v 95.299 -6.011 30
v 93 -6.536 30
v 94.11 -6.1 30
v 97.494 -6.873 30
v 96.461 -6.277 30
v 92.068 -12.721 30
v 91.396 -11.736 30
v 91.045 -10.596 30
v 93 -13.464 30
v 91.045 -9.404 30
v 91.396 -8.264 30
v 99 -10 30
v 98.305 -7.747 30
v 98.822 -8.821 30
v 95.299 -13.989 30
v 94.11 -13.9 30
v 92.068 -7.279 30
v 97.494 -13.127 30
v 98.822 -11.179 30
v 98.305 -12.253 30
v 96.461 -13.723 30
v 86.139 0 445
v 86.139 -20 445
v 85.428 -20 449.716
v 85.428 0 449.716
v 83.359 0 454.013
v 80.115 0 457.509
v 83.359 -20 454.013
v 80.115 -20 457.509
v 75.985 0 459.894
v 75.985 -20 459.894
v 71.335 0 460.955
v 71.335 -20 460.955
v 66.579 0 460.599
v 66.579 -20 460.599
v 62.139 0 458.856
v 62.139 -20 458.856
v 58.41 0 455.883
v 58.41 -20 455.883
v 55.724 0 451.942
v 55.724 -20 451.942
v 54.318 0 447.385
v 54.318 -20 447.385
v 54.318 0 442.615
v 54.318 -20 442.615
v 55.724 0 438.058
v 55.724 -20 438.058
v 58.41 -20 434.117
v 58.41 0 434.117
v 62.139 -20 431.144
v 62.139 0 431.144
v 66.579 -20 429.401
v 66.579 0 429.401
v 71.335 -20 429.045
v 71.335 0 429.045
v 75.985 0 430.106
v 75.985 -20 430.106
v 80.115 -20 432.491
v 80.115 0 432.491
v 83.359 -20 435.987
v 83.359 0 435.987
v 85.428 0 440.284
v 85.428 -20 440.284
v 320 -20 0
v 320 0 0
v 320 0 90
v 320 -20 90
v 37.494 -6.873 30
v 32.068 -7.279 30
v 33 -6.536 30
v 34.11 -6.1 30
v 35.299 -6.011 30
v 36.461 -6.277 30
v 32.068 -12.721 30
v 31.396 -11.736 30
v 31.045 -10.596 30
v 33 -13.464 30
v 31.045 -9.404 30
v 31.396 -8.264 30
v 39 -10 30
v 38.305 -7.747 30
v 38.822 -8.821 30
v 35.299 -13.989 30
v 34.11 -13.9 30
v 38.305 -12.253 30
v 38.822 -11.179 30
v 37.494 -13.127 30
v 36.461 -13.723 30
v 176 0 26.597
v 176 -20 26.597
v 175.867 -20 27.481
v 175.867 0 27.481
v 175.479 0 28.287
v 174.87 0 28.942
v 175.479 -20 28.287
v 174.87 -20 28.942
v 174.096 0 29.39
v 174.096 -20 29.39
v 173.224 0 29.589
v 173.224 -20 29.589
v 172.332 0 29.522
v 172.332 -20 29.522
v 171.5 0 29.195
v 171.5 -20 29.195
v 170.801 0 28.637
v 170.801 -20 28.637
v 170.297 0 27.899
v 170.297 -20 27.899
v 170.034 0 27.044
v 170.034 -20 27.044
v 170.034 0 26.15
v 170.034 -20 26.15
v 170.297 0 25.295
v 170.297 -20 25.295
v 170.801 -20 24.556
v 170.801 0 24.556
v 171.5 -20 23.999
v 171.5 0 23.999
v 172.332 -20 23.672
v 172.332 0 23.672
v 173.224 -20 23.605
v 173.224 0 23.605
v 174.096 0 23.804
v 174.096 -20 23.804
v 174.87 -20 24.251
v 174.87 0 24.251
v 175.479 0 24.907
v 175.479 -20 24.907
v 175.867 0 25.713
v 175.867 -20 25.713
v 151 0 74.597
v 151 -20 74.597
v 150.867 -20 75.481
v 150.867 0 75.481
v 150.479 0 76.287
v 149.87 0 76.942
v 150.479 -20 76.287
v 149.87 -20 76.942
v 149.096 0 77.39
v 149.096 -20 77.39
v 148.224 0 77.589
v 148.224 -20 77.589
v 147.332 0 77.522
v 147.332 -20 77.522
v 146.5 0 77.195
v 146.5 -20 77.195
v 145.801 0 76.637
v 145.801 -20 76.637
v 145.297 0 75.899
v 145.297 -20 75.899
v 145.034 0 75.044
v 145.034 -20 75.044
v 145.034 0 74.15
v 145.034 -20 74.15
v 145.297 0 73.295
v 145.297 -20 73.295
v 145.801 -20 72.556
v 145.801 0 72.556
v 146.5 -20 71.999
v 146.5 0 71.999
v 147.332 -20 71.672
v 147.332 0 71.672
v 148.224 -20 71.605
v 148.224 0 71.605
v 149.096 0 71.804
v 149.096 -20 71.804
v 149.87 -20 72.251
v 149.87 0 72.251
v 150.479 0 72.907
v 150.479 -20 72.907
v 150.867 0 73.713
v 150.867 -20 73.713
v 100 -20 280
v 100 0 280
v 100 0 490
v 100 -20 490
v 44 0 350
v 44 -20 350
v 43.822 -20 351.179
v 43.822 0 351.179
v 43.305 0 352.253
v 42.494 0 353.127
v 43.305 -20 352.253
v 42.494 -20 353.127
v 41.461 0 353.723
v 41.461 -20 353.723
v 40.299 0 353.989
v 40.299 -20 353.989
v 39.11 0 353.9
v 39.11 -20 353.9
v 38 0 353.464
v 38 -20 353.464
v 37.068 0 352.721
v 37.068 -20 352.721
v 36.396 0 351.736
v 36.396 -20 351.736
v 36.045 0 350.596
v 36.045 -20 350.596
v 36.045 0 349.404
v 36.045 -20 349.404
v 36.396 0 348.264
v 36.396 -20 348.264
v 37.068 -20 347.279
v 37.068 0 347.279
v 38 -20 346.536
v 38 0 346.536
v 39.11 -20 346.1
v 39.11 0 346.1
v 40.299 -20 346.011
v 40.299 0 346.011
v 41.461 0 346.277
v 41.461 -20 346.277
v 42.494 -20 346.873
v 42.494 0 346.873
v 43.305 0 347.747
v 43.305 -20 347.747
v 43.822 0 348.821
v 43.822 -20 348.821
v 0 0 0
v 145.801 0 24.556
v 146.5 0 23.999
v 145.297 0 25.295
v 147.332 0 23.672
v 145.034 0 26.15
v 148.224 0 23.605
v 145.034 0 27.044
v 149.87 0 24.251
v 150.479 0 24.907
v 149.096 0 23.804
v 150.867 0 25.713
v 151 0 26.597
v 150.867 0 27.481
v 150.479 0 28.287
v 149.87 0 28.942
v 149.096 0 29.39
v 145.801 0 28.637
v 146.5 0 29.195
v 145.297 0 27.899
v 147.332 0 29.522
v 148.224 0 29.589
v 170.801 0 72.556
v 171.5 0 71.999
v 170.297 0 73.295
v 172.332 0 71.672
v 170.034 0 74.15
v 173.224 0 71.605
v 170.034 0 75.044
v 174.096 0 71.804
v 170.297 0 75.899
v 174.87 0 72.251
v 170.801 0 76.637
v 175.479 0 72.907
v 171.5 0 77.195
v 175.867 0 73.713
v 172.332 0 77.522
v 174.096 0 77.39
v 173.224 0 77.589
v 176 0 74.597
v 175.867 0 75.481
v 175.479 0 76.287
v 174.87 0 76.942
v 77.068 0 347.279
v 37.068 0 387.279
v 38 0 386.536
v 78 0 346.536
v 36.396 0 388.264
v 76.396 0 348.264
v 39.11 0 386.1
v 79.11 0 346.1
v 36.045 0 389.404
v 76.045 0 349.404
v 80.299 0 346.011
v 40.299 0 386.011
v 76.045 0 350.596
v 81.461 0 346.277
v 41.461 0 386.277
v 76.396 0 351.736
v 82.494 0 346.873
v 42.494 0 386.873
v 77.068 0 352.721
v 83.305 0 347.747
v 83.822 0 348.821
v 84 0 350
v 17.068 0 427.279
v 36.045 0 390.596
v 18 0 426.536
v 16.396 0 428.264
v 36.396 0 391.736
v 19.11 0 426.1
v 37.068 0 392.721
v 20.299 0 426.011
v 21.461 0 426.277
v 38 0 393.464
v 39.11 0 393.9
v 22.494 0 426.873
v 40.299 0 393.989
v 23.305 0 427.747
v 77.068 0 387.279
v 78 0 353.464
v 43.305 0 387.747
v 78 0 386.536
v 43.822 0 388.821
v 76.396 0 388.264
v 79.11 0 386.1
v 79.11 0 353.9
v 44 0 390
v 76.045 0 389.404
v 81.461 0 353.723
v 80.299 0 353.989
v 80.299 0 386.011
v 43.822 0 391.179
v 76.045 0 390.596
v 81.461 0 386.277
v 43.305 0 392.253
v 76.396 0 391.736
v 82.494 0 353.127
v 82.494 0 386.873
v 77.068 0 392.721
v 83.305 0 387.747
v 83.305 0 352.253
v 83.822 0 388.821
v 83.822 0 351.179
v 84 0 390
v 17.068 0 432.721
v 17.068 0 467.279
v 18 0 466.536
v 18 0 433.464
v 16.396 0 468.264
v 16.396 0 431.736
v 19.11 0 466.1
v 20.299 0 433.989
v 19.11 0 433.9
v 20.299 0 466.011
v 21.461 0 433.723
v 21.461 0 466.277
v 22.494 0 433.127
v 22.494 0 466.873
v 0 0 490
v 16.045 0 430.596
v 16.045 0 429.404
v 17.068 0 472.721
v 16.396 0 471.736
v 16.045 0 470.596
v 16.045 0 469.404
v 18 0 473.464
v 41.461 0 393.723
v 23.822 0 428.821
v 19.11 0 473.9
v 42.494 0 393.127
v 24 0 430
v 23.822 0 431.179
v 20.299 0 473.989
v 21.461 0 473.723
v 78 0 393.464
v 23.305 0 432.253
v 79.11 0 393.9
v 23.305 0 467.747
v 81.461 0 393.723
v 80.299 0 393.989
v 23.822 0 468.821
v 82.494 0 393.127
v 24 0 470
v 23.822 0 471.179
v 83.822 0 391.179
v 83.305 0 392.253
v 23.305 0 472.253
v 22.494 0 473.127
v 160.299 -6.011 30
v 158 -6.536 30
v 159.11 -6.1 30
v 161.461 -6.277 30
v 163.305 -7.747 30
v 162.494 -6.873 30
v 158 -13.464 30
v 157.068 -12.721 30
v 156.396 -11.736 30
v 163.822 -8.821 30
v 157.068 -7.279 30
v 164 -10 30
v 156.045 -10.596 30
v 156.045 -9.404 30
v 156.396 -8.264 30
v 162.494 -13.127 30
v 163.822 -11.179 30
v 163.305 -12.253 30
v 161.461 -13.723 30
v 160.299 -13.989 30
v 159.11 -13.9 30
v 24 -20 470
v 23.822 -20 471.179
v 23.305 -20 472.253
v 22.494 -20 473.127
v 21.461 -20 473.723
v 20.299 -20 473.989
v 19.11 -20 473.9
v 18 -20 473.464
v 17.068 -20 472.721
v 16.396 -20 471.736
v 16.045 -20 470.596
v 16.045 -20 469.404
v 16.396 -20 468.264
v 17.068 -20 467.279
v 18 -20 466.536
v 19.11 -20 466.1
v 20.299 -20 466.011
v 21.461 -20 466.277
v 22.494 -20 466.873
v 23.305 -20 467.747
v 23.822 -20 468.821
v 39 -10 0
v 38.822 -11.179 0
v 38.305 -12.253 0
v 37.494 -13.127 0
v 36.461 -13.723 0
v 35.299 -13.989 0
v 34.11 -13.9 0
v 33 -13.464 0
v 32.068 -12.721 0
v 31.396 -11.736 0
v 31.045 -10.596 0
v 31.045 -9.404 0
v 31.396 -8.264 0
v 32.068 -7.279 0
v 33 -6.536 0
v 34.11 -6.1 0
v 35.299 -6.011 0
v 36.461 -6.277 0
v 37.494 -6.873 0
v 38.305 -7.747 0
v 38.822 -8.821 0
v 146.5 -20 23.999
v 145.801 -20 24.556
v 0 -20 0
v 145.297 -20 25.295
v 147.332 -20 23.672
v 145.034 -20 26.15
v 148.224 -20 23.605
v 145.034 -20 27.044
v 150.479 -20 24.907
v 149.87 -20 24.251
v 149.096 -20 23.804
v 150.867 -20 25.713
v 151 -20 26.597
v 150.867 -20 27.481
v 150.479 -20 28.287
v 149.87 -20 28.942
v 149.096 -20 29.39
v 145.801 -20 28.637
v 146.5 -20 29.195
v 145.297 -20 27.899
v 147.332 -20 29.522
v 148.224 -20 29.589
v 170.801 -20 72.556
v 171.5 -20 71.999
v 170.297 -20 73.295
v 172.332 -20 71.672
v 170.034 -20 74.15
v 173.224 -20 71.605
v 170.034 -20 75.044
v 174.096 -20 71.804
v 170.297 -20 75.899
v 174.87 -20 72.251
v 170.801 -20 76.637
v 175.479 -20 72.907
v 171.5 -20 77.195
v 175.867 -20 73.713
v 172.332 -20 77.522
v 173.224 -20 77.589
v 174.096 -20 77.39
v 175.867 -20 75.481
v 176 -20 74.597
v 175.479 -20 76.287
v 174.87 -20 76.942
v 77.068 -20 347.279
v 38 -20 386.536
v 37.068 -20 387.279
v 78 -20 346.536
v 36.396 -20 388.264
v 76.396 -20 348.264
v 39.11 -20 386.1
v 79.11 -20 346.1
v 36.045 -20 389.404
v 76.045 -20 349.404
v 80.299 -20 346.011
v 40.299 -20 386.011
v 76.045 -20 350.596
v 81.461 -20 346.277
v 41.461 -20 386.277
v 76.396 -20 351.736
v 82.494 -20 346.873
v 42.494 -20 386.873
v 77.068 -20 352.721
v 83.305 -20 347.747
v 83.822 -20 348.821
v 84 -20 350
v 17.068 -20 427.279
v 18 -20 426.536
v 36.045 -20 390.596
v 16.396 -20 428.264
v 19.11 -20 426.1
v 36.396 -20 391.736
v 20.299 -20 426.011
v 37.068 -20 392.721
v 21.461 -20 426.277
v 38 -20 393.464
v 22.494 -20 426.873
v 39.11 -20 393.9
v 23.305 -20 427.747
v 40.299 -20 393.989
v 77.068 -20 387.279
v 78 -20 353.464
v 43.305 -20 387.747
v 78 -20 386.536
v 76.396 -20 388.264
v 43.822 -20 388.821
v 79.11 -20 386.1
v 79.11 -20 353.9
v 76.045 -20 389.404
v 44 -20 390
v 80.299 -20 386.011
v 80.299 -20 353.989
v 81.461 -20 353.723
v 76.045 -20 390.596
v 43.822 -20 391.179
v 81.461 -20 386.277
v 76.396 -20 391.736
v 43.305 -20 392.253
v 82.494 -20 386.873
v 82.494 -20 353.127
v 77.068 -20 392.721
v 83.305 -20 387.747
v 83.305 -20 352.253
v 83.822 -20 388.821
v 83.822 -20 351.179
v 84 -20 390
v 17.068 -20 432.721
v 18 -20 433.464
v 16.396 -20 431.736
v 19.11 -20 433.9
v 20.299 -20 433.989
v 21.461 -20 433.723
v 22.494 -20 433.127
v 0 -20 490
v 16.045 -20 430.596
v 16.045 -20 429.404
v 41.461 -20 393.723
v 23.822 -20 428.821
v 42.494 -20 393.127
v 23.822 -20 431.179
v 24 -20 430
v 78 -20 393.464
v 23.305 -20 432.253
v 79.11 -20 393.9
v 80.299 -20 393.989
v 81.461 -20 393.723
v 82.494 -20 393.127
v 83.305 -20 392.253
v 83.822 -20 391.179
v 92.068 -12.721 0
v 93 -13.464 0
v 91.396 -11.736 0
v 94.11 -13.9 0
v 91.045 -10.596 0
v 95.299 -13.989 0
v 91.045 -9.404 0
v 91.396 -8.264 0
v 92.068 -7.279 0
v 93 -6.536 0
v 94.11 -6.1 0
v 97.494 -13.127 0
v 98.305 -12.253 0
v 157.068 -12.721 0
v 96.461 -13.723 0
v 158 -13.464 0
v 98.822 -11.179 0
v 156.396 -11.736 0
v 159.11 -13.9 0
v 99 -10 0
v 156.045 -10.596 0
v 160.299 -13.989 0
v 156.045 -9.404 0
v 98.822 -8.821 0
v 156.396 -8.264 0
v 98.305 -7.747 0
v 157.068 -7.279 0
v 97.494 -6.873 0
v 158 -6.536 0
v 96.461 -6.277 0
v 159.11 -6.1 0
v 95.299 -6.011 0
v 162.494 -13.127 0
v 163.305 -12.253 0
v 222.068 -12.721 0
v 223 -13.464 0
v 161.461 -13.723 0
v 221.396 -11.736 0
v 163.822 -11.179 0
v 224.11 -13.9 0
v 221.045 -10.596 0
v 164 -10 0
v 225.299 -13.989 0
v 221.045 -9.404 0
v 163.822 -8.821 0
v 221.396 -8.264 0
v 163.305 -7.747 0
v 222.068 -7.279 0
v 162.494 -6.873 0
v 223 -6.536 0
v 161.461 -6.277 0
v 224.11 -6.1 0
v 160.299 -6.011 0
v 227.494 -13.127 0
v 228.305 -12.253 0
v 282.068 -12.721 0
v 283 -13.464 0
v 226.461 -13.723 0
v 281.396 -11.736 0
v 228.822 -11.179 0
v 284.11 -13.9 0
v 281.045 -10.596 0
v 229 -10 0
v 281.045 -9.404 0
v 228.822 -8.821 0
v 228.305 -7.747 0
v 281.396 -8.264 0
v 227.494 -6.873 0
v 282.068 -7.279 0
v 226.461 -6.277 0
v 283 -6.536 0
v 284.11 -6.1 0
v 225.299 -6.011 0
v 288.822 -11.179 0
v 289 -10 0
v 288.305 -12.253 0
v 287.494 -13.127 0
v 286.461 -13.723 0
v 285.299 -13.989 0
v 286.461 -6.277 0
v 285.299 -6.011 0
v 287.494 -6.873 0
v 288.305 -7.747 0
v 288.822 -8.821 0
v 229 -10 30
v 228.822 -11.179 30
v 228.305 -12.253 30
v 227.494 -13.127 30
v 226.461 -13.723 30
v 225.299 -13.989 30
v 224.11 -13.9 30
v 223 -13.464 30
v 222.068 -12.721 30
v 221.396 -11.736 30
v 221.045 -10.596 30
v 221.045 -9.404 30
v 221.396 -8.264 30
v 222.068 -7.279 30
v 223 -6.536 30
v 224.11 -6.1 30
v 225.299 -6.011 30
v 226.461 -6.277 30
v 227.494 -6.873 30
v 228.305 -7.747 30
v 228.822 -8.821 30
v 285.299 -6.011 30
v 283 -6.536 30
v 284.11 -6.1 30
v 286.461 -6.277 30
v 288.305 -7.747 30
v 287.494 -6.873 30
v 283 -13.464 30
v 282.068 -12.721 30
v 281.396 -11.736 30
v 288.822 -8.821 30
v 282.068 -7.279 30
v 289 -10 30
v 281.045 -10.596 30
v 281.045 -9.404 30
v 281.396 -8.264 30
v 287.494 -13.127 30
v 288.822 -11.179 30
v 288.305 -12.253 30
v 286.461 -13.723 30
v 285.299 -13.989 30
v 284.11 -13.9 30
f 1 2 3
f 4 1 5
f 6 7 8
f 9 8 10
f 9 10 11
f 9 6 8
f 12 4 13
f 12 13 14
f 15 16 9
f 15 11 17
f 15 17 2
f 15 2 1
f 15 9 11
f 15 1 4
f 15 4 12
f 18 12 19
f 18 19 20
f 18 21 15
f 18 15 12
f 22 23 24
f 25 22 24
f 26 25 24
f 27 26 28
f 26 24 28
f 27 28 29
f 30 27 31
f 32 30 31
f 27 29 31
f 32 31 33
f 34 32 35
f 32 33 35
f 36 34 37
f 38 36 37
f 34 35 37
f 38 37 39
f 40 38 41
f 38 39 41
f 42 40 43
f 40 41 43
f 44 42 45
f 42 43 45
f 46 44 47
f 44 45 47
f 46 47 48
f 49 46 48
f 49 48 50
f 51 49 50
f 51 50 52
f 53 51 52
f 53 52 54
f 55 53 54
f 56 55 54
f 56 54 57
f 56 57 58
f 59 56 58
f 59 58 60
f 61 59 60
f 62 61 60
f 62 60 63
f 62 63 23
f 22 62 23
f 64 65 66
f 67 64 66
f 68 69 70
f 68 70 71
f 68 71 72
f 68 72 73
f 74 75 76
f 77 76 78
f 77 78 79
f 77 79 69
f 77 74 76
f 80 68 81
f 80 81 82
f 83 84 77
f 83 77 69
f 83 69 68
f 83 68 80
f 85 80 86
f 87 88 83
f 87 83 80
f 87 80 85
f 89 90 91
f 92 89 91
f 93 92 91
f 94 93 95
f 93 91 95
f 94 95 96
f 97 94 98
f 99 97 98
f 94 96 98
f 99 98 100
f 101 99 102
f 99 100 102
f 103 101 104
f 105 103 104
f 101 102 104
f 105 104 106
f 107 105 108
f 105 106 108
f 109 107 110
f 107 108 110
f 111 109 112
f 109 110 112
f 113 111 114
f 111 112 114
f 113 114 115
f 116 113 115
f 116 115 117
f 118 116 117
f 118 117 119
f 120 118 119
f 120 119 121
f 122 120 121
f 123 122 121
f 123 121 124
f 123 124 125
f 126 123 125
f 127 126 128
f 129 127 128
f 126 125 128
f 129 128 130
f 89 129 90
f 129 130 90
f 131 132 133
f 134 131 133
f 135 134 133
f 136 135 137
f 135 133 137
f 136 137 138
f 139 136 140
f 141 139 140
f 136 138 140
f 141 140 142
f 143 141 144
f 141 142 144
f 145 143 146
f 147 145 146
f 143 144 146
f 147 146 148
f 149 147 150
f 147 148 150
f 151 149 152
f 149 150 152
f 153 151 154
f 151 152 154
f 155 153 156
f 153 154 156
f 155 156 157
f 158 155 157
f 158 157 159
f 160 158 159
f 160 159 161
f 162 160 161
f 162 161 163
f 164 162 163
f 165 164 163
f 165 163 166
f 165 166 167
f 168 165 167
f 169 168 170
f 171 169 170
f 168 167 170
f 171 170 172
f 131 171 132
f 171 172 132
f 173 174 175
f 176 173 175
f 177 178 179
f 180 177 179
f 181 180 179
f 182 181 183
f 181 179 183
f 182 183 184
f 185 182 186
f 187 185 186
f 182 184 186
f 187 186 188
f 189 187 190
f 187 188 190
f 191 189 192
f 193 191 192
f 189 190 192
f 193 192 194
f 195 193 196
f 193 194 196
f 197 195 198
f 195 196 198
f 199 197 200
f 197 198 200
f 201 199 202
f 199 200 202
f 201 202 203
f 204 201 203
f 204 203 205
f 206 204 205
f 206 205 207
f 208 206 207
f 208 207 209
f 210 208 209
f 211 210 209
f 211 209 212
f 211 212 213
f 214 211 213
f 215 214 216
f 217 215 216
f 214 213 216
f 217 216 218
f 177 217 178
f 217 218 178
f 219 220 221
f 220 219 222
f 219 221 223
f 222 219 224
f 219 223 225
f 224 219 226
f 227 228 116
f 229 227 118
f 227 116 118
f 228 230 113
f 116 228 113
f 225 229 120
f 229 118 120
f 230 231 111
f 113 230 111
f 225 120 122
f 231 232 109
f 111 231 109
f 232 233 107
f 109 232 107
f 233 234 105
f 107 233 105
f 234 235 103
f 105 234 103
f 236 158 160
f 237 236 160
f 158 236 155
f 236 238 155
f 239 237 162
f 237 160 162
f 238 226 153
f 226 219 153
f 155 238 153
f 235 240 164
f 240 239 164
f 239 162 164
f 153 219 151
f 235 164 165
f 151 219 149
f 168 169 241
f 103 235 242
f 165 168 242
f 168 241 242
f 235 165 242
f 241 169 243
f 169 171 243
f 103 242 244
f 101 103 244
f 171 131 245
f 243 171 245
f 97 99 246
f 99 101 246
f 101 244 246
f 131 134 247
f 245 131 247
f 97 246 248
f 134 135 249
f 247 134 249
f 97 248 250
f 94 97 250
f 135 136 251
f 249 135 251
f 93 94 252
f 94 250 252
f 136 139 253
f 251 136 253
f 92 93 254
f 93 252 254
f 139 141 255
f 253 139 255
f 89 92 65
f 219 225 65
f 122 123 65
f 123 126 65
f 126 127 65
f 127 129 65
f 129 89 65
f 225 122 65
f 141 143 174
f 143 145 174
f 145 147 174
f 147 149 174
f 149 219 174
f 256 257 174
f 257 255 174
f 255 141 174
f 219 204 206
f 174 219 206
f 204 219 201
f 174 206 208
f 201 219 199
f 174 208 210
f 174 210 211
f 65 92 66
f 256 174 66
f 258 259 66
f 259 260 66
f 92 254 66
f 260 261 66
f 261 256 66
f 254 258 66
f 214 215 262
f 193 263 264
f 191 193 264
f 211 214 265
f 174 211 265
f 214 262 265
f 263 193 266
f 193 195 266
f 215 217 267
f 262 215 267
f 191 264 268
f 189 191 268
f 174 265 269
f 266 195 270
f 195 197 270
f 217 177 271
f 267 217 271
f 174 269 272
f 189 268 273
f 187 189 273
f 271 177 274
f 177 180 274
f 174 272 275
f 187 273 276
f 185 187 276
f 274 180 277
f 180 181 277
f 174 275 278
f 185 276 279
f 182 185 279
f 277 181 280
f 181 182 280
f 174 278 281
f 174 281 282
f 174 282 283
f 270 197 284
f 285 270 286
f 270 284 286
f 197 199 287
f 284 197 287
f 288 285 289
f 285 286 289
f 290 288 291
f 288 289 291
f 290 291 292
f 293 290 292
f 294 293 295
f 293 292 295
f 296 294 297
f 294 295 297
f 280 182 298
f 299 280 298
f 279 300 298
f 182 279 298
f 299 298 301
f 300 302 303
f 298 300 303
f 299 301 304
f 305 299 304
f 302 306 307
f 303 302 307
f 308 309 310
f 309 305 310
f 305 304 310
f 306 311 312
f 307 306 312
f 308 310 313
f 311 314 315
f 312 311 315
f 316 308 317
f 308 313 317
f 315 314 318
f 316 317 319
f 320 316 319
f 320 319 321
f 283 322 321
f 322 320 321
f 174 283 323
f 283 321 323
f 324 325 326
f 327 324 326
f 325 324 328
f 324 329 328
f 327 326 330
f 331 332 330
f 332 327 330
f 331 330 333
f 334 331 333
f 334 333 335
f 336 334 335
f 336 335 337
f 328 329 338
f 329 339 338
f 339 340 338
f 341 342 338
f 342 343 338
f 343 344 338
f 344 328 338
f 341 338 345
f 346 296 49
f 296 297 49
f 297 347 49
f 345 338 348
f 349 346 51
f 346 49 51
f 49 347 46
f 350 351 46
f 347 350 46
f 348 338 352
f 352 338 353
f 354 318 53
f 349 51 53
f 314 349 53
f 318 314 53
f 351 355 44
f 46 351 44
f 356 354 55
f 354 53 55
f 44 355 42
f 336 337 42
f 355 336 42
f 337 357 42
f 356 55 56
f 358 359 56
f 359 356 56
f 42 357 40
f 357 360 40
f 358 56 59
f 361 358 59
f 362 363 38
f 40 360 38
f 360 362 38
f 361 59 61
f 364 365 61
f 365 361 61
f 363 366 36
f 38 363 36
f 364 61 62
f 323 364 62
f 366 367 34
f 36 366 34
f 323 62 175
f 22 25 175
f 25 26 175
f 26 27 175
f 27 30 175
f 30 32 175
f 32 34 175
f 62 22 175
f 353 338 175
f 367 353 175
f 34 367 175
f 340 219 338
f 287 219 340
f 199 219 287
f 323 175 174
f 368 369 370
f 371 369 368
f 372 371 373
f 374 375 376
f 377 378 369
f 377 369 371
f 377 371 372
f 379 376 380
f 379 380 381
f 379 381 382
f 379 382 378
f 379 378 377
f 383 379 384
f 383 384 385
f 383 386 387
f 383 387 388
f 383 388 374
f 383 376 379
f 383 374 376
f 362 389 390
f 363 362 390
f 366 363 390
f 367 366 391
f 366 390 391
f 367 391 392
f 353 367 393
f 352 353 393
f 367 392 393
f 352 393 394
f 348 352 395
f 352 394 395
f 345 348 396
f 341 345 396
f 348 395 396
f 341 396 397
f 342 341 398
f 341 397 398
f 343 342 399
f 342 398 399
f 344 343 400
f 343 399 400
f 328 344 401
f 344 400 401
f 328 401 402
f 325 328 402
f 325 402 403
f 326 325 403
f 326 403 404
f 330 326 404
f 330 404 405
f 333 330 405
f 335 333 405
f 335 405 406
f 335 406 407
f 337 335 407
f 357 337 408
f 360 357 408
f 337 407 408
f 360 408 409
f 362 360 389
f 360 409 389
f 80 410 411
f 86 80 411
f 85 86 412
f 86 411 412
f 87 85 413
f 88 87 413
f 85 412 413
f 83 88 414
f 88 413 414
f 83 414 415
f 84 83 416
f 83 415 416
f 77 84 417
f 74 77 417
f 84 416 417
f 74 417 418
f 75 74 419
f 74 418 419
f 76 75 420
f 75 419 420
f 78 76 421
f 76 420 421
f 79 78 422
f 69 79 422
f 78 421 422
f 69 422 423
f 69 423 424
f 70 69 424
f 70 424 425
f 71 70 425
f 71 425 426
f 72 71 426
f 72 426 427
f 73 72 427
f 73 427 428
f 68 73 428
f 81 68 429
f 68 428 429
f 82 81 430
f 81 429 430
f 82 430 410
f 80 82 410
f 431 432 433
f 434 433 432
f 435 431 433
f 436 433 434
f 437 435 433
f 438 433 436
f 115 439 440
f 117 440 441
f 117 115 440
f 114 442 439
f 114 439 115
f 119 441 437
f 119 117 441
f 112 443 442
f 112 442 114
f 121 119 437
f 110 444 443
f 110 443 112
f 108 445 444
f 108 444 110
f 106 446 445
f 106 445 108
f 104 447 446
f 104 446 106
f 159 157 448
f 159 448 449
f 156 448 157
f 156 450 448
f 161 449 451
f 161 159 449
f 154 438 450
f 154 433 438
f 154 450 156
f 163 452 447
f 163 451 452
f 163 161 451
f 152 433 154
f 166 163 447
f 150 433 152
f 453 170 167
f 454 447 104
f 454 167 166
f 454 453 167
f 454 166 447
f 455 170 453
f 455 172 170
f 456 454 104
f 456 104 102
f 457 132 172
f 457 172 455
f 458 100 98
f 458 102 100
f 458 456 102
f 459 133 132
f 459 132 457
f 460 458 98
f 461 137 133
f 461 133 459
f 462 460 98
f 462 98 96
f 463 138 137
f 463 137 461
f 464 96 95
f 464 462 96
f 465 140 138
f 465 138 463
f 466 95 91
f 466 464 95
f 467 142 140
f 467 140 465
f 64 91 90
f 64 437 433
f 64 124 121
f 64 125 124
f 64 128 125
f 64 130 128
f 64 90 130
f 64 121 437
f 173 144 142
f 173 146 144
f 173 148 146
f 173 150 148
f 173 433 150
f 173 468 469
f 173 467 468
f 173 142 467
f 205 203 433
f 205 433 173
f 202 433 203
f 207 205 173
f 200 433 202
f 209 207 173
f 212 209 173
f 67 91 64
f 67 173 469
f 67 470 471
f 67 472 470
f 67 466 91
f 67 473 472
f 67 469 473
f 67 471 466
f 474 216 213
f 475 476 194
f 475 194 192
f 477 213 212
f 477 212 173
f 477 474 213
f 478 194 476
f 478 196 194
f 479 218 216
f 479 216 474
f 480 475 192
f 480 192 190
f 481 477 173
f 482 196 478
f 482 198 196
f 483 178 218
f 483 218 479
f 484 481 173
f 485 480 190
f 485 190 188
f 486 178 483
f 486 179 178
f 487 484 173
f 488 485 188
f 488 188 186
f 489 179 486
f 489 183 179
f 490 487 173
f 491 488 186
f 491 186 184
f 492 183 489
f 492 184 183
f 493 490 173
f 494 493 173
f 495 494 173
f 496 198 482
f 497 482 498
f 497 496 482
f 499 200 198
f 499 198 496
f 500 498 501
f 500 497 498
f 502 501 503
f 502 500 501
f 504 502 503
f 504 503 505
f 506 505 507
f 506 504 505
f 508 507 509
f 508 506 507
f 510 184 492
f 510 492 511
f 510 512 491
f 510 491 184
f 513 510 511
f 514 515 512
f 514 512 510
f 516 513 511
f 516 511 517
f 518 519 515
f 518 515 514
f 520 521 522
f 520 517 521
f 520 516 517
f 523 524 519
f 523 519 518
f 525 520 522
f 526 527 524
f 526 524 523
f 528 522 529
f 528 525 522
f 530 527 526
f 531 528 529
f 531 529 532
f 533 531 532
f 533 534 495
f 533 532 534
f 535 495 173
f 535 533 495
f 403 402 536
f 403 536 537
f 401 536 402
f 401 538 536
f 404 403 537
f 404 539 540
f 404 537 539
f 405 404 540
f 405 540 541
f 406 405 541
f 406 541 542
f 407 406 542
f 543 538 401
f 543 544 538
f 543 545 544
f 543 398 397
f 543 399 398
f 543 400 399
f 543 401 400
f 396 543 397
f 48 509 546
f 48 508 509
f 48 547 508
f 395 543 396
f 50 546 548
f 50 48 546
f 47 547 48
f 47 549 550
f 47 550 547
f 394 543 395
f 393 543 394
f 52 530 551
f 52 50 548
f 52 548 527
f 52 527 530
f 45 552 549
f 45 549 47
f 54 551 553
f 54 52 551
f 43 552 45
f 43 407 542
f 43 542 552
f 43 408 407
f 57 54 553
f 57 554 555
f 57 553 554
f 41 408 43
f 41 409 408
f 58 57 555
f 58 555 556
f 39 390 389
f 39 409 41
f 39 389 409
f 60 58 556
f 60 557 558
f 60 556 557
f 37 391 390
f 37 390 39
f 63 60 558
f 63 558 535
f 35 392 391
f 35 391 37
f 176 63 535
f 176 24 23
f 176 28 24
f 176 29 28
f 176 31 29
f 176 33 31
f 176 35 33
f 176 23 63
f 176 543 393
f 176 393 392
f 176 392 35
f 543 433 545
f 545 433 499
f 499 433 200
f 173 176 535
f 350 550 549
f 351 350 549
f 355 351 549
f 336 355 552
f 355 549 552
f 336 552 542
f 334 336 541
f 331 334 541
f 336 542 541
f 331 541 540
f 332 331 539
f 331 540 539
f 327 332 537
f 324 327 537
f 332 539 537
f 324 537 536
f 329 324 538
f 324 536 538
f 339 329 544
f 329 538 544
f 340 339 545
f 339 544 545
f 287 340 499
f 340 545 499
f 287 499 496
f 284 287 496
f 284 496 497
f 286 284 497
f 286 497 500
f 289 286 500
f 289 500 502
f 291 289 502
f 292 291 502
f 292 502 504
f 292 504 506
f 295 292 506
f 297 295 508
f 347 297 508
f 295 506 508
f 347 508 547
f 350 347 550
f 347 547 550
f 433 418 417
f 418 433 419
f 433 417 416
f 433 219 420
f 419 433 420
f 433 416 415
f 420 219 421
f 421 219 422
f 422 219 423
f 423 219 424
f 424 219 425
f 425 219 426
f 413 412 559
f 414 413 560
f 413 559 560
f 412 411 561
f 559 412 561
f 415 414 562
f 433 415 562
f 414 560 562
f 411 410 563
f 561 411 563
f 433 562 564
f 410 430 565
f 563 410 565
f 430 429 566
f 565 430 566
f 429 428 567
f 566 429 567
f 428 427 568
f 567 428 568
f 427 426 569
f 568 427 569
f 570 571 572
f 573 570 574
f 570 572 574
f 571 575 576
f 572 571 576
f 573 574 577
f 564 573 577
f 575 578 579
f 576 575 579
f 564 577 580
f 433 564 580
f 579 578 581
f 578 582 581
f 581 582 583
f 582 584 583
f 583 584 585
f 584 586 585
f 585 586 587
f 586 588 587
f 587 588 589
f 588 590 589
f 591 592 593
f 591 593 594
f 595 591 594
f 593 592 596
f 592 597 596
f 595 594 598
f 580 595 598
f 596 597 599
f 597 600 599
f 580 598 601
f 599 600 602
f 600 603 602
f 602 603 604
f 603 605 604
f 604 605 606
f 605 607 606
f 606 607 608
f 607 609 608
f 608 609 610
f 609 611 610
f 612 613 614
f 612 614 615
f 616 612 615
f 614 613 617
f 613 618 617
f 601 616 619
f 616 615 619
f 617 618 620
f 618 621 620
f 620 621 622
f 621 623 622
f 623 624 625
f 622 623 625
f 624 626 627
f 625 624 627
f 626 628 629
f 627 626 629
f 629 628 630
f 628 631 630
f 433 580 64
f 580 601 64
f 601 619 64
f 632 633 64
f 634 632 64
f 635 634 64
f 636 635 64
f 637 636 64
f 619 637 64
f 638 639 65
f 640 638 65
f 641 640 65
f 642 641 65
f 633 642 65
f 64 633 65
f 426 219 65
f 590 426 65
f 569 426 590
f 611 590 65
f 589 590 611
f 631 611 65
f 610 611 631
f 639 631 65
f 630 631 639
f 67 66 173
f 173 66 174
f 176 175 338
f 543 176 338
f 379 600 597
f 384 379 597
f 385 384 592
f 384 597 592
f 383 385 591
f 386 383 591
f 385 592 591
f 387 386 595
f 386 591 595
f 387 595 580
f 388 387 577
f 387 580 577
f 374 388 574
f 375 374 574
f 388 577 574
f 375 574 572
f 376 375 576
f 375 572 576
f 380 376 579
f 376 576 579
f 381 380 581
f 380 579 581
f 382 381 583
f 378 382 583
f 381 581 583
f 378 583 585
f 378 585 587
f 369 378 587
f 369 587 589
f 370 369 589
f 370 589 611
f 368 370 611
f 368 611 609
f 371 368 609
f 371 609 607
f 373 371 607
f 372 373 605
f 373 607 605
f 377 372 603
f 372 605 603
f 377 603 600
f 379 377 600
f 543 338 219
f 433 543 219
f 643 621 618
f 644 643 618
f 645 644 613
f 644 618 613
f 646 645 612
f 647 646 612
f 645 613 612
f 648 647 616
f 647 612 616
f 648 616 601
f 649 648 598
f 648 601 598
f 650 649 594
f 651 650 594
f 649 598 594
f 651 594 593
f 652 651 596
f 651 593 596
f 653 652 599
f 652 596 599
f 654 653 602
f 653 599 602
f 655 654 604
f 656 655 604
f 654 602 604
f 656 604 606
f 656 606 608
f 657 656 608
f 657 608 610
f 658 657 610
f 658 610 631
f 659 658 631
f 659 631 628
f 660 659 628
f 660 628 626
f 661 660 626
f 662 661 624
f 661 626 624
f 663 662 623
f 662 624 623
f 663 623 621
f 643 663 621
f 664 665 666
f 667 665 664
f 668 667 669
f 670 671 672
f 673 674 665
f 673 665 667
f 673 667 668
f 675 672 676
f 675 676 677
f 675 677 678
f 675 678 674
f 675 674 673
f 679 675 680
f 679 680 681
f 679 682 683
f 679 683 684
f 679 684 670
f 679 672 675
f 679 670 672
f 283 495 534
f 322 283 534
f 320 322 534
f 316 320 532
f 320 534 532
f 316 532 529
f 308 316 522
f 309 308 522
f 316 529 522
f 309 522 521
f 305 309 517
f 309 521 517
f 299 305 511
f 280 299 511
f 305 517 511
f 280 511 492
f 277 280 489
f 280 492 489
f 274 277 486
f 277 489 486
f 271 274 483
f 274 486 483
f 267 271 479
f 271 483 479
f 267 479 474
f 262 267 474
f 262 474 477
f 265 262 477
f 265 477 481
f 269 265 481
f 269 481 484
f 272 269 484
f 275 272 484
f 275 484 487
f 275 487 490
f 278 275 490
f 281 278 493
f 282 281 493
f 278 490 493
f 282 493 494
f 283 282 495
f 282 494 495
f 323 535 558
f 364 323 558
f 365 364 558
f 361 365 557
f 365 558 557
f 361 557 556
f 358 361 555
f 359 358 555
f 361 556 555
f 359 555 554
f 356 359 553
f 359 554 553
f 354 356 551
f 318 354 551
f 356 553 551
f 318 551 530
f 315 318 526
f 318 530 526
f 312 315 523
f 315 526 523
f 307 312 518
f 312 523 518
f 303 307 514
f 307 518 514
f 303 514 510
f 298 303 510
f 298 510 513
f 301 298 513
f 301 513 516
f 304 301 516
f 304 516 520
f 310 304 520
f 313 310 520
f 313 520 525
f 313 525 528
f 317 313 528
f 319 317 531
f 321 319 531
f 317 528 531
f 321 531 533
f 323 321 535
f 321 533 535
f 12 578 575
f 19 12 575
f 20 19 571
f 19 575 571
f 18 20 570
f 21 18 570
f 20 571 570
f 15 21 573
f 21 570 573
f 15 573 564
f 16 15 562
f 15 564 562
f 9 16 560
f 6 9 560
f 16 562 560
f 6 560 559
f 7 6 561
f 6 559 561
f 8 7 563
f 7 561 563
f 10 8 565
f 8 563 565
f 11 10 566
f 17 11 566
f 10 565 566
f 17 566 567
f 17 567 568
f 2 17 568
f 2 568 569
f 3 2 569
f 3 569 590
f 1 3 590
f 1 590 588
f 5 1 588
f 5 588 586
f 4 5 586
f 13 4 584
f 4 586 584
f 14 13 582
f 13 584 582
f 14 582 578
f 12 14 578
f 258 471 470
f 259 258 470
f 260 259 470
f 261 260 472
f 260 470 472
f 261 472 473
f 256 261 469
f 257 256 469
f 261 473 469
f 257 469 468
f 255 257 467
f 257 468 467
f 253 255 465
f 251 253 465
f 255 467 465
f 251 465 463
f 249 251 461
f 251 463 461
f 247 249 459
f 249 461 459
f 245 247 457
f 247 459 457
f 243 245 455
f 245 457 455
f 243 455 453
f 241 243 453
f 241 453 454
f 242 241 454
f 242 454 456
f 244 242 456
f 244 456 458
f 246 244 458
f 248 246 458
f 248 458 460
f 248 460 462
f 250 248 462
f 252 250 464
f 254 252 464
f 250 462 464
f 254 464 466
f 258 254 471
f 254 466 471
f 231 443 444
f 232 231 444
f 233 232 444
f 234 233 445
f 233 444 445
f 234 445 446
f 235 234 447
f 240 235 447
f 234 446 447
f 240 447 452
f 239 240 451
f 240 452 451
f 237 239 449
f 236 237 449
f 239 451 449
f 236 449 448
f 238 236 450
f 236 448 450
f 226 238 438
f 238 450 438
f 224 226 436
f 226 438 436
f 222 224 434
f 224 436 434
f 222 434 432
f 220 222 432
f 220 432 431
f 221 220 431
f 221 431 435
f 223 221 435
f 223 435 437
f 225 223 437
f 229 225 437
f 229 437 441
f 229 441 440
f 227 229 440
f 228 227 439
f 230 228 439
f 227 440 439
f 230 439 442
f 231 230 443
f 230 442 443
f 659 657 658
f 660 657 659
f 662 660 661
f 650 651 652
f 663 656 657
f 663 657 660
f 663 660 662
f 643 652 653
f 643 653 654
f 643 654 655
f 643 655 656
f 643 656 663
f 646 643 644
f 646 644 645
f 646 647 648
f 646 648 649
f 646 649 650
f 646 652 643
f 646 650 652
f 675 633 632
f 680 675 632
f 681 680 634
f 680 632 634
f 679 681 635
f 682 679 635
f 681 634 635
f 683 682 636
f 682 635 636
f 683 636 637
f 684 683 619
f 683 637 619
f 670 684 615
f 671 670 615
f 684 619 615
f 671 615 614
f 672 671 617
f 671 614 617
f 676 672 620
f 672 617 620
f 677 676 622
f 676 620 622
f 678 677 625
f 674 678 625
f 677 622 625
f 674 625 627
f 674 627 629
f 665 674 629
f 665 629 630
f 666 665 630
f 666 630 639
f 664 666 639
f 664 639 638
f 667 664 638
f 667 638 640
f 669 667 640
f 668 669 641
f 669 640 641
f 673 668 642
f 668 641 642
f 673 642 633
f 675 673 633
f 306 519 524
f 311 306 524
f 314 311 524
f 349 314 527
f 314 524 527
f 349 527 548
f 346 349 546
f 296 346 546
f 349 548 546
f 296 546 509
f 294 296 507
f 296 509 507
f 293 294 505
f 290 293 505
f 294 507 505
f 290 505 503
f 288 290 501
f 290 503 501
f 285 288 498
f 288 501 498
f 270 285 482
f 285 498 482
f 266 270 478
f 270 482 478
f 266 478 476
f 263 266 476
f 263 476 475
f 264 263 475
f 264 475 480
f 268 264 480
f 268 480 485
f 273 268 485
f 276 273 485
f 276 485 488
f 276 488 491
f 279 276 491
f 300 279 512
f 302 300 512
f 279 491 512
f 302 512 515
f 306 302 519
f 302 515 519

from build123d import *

# Parameters (mm, degrees)
F1_DEPTH = 20
F2_R     = 3
F2_R_2   = 4
F3_DEPTH = 20
F4_R     = 4
F5_DEPTH = 30
F6_R     = 16
F7_DEPTH = 25


with BuildPart() as f1:
    # F0 (on Front) → F1 (new body)
    with BuildSketch(Plane.XZ):
        Polygon((0, 490), (0, 0), (320, 0), (320, 90), (100, 280), (100, 490), align=None)
    extrude(amount=F1_DEPTH)

    # F2 (on face) → F3 (cut)
    with BuildSketch(Plane.XZ.offset(20)):
        with Locations((148, 26.596917)):
            Circle(F2_R)
        with Locations((148, 74.596917)):
            Circle(F2_R)
        with Locations((173, 74.596917)):
            Circle(F2_R)
        with Locations((173, 26.596917)):
            Circle(F2_R)
        with Locations((20, 470)):
            Circle(F2_R_2)
        with Locations((20, 430)):
            Circle(F2_R_2)
        with Locations((40, 390)):
            Circle(F2_R_2)
        with Locations((80, 390)):
            Circle(F2_R_2)
        with Locations((40, 350)):
            Circle(F2_R_2)
        with Locations((80, 350)):
            Circle(F2_R_2)
    extrude(amount=-F3_DEPTH, mode=Mode.SUBTRACT)

    # F4 (on face) → F5 (cut)
    with BuildSketch(Plane(origin=(0, 0, 0), x_dir=(1, 0, 0), z_dir=(0, 0, -1))):
        with Locations((35, 10)):
            Circle(F4_R)
        with Locations((95, 10)):
            Circle(F4_R)
        with Locations((160, 10)):
            Circle(F4_R)
        with Locations((225, 10)):
            Circle(F4_R)
        with Locations((285, 10)):
            Circle(F4_R)
    extrude(amount=-F5_DEPTH, mode=Mode.SUBTRACT)

    # F6 (on face) → F7 (cut)
    with BuildSketch(Plane.XZ.offset(20)):
        with Locations((70.1391, 445)):
            Circle(F6_R)
    extrude(amount=-F7_DEPTH, mode=Mode.SUBTRACT)


solid = f1.part
